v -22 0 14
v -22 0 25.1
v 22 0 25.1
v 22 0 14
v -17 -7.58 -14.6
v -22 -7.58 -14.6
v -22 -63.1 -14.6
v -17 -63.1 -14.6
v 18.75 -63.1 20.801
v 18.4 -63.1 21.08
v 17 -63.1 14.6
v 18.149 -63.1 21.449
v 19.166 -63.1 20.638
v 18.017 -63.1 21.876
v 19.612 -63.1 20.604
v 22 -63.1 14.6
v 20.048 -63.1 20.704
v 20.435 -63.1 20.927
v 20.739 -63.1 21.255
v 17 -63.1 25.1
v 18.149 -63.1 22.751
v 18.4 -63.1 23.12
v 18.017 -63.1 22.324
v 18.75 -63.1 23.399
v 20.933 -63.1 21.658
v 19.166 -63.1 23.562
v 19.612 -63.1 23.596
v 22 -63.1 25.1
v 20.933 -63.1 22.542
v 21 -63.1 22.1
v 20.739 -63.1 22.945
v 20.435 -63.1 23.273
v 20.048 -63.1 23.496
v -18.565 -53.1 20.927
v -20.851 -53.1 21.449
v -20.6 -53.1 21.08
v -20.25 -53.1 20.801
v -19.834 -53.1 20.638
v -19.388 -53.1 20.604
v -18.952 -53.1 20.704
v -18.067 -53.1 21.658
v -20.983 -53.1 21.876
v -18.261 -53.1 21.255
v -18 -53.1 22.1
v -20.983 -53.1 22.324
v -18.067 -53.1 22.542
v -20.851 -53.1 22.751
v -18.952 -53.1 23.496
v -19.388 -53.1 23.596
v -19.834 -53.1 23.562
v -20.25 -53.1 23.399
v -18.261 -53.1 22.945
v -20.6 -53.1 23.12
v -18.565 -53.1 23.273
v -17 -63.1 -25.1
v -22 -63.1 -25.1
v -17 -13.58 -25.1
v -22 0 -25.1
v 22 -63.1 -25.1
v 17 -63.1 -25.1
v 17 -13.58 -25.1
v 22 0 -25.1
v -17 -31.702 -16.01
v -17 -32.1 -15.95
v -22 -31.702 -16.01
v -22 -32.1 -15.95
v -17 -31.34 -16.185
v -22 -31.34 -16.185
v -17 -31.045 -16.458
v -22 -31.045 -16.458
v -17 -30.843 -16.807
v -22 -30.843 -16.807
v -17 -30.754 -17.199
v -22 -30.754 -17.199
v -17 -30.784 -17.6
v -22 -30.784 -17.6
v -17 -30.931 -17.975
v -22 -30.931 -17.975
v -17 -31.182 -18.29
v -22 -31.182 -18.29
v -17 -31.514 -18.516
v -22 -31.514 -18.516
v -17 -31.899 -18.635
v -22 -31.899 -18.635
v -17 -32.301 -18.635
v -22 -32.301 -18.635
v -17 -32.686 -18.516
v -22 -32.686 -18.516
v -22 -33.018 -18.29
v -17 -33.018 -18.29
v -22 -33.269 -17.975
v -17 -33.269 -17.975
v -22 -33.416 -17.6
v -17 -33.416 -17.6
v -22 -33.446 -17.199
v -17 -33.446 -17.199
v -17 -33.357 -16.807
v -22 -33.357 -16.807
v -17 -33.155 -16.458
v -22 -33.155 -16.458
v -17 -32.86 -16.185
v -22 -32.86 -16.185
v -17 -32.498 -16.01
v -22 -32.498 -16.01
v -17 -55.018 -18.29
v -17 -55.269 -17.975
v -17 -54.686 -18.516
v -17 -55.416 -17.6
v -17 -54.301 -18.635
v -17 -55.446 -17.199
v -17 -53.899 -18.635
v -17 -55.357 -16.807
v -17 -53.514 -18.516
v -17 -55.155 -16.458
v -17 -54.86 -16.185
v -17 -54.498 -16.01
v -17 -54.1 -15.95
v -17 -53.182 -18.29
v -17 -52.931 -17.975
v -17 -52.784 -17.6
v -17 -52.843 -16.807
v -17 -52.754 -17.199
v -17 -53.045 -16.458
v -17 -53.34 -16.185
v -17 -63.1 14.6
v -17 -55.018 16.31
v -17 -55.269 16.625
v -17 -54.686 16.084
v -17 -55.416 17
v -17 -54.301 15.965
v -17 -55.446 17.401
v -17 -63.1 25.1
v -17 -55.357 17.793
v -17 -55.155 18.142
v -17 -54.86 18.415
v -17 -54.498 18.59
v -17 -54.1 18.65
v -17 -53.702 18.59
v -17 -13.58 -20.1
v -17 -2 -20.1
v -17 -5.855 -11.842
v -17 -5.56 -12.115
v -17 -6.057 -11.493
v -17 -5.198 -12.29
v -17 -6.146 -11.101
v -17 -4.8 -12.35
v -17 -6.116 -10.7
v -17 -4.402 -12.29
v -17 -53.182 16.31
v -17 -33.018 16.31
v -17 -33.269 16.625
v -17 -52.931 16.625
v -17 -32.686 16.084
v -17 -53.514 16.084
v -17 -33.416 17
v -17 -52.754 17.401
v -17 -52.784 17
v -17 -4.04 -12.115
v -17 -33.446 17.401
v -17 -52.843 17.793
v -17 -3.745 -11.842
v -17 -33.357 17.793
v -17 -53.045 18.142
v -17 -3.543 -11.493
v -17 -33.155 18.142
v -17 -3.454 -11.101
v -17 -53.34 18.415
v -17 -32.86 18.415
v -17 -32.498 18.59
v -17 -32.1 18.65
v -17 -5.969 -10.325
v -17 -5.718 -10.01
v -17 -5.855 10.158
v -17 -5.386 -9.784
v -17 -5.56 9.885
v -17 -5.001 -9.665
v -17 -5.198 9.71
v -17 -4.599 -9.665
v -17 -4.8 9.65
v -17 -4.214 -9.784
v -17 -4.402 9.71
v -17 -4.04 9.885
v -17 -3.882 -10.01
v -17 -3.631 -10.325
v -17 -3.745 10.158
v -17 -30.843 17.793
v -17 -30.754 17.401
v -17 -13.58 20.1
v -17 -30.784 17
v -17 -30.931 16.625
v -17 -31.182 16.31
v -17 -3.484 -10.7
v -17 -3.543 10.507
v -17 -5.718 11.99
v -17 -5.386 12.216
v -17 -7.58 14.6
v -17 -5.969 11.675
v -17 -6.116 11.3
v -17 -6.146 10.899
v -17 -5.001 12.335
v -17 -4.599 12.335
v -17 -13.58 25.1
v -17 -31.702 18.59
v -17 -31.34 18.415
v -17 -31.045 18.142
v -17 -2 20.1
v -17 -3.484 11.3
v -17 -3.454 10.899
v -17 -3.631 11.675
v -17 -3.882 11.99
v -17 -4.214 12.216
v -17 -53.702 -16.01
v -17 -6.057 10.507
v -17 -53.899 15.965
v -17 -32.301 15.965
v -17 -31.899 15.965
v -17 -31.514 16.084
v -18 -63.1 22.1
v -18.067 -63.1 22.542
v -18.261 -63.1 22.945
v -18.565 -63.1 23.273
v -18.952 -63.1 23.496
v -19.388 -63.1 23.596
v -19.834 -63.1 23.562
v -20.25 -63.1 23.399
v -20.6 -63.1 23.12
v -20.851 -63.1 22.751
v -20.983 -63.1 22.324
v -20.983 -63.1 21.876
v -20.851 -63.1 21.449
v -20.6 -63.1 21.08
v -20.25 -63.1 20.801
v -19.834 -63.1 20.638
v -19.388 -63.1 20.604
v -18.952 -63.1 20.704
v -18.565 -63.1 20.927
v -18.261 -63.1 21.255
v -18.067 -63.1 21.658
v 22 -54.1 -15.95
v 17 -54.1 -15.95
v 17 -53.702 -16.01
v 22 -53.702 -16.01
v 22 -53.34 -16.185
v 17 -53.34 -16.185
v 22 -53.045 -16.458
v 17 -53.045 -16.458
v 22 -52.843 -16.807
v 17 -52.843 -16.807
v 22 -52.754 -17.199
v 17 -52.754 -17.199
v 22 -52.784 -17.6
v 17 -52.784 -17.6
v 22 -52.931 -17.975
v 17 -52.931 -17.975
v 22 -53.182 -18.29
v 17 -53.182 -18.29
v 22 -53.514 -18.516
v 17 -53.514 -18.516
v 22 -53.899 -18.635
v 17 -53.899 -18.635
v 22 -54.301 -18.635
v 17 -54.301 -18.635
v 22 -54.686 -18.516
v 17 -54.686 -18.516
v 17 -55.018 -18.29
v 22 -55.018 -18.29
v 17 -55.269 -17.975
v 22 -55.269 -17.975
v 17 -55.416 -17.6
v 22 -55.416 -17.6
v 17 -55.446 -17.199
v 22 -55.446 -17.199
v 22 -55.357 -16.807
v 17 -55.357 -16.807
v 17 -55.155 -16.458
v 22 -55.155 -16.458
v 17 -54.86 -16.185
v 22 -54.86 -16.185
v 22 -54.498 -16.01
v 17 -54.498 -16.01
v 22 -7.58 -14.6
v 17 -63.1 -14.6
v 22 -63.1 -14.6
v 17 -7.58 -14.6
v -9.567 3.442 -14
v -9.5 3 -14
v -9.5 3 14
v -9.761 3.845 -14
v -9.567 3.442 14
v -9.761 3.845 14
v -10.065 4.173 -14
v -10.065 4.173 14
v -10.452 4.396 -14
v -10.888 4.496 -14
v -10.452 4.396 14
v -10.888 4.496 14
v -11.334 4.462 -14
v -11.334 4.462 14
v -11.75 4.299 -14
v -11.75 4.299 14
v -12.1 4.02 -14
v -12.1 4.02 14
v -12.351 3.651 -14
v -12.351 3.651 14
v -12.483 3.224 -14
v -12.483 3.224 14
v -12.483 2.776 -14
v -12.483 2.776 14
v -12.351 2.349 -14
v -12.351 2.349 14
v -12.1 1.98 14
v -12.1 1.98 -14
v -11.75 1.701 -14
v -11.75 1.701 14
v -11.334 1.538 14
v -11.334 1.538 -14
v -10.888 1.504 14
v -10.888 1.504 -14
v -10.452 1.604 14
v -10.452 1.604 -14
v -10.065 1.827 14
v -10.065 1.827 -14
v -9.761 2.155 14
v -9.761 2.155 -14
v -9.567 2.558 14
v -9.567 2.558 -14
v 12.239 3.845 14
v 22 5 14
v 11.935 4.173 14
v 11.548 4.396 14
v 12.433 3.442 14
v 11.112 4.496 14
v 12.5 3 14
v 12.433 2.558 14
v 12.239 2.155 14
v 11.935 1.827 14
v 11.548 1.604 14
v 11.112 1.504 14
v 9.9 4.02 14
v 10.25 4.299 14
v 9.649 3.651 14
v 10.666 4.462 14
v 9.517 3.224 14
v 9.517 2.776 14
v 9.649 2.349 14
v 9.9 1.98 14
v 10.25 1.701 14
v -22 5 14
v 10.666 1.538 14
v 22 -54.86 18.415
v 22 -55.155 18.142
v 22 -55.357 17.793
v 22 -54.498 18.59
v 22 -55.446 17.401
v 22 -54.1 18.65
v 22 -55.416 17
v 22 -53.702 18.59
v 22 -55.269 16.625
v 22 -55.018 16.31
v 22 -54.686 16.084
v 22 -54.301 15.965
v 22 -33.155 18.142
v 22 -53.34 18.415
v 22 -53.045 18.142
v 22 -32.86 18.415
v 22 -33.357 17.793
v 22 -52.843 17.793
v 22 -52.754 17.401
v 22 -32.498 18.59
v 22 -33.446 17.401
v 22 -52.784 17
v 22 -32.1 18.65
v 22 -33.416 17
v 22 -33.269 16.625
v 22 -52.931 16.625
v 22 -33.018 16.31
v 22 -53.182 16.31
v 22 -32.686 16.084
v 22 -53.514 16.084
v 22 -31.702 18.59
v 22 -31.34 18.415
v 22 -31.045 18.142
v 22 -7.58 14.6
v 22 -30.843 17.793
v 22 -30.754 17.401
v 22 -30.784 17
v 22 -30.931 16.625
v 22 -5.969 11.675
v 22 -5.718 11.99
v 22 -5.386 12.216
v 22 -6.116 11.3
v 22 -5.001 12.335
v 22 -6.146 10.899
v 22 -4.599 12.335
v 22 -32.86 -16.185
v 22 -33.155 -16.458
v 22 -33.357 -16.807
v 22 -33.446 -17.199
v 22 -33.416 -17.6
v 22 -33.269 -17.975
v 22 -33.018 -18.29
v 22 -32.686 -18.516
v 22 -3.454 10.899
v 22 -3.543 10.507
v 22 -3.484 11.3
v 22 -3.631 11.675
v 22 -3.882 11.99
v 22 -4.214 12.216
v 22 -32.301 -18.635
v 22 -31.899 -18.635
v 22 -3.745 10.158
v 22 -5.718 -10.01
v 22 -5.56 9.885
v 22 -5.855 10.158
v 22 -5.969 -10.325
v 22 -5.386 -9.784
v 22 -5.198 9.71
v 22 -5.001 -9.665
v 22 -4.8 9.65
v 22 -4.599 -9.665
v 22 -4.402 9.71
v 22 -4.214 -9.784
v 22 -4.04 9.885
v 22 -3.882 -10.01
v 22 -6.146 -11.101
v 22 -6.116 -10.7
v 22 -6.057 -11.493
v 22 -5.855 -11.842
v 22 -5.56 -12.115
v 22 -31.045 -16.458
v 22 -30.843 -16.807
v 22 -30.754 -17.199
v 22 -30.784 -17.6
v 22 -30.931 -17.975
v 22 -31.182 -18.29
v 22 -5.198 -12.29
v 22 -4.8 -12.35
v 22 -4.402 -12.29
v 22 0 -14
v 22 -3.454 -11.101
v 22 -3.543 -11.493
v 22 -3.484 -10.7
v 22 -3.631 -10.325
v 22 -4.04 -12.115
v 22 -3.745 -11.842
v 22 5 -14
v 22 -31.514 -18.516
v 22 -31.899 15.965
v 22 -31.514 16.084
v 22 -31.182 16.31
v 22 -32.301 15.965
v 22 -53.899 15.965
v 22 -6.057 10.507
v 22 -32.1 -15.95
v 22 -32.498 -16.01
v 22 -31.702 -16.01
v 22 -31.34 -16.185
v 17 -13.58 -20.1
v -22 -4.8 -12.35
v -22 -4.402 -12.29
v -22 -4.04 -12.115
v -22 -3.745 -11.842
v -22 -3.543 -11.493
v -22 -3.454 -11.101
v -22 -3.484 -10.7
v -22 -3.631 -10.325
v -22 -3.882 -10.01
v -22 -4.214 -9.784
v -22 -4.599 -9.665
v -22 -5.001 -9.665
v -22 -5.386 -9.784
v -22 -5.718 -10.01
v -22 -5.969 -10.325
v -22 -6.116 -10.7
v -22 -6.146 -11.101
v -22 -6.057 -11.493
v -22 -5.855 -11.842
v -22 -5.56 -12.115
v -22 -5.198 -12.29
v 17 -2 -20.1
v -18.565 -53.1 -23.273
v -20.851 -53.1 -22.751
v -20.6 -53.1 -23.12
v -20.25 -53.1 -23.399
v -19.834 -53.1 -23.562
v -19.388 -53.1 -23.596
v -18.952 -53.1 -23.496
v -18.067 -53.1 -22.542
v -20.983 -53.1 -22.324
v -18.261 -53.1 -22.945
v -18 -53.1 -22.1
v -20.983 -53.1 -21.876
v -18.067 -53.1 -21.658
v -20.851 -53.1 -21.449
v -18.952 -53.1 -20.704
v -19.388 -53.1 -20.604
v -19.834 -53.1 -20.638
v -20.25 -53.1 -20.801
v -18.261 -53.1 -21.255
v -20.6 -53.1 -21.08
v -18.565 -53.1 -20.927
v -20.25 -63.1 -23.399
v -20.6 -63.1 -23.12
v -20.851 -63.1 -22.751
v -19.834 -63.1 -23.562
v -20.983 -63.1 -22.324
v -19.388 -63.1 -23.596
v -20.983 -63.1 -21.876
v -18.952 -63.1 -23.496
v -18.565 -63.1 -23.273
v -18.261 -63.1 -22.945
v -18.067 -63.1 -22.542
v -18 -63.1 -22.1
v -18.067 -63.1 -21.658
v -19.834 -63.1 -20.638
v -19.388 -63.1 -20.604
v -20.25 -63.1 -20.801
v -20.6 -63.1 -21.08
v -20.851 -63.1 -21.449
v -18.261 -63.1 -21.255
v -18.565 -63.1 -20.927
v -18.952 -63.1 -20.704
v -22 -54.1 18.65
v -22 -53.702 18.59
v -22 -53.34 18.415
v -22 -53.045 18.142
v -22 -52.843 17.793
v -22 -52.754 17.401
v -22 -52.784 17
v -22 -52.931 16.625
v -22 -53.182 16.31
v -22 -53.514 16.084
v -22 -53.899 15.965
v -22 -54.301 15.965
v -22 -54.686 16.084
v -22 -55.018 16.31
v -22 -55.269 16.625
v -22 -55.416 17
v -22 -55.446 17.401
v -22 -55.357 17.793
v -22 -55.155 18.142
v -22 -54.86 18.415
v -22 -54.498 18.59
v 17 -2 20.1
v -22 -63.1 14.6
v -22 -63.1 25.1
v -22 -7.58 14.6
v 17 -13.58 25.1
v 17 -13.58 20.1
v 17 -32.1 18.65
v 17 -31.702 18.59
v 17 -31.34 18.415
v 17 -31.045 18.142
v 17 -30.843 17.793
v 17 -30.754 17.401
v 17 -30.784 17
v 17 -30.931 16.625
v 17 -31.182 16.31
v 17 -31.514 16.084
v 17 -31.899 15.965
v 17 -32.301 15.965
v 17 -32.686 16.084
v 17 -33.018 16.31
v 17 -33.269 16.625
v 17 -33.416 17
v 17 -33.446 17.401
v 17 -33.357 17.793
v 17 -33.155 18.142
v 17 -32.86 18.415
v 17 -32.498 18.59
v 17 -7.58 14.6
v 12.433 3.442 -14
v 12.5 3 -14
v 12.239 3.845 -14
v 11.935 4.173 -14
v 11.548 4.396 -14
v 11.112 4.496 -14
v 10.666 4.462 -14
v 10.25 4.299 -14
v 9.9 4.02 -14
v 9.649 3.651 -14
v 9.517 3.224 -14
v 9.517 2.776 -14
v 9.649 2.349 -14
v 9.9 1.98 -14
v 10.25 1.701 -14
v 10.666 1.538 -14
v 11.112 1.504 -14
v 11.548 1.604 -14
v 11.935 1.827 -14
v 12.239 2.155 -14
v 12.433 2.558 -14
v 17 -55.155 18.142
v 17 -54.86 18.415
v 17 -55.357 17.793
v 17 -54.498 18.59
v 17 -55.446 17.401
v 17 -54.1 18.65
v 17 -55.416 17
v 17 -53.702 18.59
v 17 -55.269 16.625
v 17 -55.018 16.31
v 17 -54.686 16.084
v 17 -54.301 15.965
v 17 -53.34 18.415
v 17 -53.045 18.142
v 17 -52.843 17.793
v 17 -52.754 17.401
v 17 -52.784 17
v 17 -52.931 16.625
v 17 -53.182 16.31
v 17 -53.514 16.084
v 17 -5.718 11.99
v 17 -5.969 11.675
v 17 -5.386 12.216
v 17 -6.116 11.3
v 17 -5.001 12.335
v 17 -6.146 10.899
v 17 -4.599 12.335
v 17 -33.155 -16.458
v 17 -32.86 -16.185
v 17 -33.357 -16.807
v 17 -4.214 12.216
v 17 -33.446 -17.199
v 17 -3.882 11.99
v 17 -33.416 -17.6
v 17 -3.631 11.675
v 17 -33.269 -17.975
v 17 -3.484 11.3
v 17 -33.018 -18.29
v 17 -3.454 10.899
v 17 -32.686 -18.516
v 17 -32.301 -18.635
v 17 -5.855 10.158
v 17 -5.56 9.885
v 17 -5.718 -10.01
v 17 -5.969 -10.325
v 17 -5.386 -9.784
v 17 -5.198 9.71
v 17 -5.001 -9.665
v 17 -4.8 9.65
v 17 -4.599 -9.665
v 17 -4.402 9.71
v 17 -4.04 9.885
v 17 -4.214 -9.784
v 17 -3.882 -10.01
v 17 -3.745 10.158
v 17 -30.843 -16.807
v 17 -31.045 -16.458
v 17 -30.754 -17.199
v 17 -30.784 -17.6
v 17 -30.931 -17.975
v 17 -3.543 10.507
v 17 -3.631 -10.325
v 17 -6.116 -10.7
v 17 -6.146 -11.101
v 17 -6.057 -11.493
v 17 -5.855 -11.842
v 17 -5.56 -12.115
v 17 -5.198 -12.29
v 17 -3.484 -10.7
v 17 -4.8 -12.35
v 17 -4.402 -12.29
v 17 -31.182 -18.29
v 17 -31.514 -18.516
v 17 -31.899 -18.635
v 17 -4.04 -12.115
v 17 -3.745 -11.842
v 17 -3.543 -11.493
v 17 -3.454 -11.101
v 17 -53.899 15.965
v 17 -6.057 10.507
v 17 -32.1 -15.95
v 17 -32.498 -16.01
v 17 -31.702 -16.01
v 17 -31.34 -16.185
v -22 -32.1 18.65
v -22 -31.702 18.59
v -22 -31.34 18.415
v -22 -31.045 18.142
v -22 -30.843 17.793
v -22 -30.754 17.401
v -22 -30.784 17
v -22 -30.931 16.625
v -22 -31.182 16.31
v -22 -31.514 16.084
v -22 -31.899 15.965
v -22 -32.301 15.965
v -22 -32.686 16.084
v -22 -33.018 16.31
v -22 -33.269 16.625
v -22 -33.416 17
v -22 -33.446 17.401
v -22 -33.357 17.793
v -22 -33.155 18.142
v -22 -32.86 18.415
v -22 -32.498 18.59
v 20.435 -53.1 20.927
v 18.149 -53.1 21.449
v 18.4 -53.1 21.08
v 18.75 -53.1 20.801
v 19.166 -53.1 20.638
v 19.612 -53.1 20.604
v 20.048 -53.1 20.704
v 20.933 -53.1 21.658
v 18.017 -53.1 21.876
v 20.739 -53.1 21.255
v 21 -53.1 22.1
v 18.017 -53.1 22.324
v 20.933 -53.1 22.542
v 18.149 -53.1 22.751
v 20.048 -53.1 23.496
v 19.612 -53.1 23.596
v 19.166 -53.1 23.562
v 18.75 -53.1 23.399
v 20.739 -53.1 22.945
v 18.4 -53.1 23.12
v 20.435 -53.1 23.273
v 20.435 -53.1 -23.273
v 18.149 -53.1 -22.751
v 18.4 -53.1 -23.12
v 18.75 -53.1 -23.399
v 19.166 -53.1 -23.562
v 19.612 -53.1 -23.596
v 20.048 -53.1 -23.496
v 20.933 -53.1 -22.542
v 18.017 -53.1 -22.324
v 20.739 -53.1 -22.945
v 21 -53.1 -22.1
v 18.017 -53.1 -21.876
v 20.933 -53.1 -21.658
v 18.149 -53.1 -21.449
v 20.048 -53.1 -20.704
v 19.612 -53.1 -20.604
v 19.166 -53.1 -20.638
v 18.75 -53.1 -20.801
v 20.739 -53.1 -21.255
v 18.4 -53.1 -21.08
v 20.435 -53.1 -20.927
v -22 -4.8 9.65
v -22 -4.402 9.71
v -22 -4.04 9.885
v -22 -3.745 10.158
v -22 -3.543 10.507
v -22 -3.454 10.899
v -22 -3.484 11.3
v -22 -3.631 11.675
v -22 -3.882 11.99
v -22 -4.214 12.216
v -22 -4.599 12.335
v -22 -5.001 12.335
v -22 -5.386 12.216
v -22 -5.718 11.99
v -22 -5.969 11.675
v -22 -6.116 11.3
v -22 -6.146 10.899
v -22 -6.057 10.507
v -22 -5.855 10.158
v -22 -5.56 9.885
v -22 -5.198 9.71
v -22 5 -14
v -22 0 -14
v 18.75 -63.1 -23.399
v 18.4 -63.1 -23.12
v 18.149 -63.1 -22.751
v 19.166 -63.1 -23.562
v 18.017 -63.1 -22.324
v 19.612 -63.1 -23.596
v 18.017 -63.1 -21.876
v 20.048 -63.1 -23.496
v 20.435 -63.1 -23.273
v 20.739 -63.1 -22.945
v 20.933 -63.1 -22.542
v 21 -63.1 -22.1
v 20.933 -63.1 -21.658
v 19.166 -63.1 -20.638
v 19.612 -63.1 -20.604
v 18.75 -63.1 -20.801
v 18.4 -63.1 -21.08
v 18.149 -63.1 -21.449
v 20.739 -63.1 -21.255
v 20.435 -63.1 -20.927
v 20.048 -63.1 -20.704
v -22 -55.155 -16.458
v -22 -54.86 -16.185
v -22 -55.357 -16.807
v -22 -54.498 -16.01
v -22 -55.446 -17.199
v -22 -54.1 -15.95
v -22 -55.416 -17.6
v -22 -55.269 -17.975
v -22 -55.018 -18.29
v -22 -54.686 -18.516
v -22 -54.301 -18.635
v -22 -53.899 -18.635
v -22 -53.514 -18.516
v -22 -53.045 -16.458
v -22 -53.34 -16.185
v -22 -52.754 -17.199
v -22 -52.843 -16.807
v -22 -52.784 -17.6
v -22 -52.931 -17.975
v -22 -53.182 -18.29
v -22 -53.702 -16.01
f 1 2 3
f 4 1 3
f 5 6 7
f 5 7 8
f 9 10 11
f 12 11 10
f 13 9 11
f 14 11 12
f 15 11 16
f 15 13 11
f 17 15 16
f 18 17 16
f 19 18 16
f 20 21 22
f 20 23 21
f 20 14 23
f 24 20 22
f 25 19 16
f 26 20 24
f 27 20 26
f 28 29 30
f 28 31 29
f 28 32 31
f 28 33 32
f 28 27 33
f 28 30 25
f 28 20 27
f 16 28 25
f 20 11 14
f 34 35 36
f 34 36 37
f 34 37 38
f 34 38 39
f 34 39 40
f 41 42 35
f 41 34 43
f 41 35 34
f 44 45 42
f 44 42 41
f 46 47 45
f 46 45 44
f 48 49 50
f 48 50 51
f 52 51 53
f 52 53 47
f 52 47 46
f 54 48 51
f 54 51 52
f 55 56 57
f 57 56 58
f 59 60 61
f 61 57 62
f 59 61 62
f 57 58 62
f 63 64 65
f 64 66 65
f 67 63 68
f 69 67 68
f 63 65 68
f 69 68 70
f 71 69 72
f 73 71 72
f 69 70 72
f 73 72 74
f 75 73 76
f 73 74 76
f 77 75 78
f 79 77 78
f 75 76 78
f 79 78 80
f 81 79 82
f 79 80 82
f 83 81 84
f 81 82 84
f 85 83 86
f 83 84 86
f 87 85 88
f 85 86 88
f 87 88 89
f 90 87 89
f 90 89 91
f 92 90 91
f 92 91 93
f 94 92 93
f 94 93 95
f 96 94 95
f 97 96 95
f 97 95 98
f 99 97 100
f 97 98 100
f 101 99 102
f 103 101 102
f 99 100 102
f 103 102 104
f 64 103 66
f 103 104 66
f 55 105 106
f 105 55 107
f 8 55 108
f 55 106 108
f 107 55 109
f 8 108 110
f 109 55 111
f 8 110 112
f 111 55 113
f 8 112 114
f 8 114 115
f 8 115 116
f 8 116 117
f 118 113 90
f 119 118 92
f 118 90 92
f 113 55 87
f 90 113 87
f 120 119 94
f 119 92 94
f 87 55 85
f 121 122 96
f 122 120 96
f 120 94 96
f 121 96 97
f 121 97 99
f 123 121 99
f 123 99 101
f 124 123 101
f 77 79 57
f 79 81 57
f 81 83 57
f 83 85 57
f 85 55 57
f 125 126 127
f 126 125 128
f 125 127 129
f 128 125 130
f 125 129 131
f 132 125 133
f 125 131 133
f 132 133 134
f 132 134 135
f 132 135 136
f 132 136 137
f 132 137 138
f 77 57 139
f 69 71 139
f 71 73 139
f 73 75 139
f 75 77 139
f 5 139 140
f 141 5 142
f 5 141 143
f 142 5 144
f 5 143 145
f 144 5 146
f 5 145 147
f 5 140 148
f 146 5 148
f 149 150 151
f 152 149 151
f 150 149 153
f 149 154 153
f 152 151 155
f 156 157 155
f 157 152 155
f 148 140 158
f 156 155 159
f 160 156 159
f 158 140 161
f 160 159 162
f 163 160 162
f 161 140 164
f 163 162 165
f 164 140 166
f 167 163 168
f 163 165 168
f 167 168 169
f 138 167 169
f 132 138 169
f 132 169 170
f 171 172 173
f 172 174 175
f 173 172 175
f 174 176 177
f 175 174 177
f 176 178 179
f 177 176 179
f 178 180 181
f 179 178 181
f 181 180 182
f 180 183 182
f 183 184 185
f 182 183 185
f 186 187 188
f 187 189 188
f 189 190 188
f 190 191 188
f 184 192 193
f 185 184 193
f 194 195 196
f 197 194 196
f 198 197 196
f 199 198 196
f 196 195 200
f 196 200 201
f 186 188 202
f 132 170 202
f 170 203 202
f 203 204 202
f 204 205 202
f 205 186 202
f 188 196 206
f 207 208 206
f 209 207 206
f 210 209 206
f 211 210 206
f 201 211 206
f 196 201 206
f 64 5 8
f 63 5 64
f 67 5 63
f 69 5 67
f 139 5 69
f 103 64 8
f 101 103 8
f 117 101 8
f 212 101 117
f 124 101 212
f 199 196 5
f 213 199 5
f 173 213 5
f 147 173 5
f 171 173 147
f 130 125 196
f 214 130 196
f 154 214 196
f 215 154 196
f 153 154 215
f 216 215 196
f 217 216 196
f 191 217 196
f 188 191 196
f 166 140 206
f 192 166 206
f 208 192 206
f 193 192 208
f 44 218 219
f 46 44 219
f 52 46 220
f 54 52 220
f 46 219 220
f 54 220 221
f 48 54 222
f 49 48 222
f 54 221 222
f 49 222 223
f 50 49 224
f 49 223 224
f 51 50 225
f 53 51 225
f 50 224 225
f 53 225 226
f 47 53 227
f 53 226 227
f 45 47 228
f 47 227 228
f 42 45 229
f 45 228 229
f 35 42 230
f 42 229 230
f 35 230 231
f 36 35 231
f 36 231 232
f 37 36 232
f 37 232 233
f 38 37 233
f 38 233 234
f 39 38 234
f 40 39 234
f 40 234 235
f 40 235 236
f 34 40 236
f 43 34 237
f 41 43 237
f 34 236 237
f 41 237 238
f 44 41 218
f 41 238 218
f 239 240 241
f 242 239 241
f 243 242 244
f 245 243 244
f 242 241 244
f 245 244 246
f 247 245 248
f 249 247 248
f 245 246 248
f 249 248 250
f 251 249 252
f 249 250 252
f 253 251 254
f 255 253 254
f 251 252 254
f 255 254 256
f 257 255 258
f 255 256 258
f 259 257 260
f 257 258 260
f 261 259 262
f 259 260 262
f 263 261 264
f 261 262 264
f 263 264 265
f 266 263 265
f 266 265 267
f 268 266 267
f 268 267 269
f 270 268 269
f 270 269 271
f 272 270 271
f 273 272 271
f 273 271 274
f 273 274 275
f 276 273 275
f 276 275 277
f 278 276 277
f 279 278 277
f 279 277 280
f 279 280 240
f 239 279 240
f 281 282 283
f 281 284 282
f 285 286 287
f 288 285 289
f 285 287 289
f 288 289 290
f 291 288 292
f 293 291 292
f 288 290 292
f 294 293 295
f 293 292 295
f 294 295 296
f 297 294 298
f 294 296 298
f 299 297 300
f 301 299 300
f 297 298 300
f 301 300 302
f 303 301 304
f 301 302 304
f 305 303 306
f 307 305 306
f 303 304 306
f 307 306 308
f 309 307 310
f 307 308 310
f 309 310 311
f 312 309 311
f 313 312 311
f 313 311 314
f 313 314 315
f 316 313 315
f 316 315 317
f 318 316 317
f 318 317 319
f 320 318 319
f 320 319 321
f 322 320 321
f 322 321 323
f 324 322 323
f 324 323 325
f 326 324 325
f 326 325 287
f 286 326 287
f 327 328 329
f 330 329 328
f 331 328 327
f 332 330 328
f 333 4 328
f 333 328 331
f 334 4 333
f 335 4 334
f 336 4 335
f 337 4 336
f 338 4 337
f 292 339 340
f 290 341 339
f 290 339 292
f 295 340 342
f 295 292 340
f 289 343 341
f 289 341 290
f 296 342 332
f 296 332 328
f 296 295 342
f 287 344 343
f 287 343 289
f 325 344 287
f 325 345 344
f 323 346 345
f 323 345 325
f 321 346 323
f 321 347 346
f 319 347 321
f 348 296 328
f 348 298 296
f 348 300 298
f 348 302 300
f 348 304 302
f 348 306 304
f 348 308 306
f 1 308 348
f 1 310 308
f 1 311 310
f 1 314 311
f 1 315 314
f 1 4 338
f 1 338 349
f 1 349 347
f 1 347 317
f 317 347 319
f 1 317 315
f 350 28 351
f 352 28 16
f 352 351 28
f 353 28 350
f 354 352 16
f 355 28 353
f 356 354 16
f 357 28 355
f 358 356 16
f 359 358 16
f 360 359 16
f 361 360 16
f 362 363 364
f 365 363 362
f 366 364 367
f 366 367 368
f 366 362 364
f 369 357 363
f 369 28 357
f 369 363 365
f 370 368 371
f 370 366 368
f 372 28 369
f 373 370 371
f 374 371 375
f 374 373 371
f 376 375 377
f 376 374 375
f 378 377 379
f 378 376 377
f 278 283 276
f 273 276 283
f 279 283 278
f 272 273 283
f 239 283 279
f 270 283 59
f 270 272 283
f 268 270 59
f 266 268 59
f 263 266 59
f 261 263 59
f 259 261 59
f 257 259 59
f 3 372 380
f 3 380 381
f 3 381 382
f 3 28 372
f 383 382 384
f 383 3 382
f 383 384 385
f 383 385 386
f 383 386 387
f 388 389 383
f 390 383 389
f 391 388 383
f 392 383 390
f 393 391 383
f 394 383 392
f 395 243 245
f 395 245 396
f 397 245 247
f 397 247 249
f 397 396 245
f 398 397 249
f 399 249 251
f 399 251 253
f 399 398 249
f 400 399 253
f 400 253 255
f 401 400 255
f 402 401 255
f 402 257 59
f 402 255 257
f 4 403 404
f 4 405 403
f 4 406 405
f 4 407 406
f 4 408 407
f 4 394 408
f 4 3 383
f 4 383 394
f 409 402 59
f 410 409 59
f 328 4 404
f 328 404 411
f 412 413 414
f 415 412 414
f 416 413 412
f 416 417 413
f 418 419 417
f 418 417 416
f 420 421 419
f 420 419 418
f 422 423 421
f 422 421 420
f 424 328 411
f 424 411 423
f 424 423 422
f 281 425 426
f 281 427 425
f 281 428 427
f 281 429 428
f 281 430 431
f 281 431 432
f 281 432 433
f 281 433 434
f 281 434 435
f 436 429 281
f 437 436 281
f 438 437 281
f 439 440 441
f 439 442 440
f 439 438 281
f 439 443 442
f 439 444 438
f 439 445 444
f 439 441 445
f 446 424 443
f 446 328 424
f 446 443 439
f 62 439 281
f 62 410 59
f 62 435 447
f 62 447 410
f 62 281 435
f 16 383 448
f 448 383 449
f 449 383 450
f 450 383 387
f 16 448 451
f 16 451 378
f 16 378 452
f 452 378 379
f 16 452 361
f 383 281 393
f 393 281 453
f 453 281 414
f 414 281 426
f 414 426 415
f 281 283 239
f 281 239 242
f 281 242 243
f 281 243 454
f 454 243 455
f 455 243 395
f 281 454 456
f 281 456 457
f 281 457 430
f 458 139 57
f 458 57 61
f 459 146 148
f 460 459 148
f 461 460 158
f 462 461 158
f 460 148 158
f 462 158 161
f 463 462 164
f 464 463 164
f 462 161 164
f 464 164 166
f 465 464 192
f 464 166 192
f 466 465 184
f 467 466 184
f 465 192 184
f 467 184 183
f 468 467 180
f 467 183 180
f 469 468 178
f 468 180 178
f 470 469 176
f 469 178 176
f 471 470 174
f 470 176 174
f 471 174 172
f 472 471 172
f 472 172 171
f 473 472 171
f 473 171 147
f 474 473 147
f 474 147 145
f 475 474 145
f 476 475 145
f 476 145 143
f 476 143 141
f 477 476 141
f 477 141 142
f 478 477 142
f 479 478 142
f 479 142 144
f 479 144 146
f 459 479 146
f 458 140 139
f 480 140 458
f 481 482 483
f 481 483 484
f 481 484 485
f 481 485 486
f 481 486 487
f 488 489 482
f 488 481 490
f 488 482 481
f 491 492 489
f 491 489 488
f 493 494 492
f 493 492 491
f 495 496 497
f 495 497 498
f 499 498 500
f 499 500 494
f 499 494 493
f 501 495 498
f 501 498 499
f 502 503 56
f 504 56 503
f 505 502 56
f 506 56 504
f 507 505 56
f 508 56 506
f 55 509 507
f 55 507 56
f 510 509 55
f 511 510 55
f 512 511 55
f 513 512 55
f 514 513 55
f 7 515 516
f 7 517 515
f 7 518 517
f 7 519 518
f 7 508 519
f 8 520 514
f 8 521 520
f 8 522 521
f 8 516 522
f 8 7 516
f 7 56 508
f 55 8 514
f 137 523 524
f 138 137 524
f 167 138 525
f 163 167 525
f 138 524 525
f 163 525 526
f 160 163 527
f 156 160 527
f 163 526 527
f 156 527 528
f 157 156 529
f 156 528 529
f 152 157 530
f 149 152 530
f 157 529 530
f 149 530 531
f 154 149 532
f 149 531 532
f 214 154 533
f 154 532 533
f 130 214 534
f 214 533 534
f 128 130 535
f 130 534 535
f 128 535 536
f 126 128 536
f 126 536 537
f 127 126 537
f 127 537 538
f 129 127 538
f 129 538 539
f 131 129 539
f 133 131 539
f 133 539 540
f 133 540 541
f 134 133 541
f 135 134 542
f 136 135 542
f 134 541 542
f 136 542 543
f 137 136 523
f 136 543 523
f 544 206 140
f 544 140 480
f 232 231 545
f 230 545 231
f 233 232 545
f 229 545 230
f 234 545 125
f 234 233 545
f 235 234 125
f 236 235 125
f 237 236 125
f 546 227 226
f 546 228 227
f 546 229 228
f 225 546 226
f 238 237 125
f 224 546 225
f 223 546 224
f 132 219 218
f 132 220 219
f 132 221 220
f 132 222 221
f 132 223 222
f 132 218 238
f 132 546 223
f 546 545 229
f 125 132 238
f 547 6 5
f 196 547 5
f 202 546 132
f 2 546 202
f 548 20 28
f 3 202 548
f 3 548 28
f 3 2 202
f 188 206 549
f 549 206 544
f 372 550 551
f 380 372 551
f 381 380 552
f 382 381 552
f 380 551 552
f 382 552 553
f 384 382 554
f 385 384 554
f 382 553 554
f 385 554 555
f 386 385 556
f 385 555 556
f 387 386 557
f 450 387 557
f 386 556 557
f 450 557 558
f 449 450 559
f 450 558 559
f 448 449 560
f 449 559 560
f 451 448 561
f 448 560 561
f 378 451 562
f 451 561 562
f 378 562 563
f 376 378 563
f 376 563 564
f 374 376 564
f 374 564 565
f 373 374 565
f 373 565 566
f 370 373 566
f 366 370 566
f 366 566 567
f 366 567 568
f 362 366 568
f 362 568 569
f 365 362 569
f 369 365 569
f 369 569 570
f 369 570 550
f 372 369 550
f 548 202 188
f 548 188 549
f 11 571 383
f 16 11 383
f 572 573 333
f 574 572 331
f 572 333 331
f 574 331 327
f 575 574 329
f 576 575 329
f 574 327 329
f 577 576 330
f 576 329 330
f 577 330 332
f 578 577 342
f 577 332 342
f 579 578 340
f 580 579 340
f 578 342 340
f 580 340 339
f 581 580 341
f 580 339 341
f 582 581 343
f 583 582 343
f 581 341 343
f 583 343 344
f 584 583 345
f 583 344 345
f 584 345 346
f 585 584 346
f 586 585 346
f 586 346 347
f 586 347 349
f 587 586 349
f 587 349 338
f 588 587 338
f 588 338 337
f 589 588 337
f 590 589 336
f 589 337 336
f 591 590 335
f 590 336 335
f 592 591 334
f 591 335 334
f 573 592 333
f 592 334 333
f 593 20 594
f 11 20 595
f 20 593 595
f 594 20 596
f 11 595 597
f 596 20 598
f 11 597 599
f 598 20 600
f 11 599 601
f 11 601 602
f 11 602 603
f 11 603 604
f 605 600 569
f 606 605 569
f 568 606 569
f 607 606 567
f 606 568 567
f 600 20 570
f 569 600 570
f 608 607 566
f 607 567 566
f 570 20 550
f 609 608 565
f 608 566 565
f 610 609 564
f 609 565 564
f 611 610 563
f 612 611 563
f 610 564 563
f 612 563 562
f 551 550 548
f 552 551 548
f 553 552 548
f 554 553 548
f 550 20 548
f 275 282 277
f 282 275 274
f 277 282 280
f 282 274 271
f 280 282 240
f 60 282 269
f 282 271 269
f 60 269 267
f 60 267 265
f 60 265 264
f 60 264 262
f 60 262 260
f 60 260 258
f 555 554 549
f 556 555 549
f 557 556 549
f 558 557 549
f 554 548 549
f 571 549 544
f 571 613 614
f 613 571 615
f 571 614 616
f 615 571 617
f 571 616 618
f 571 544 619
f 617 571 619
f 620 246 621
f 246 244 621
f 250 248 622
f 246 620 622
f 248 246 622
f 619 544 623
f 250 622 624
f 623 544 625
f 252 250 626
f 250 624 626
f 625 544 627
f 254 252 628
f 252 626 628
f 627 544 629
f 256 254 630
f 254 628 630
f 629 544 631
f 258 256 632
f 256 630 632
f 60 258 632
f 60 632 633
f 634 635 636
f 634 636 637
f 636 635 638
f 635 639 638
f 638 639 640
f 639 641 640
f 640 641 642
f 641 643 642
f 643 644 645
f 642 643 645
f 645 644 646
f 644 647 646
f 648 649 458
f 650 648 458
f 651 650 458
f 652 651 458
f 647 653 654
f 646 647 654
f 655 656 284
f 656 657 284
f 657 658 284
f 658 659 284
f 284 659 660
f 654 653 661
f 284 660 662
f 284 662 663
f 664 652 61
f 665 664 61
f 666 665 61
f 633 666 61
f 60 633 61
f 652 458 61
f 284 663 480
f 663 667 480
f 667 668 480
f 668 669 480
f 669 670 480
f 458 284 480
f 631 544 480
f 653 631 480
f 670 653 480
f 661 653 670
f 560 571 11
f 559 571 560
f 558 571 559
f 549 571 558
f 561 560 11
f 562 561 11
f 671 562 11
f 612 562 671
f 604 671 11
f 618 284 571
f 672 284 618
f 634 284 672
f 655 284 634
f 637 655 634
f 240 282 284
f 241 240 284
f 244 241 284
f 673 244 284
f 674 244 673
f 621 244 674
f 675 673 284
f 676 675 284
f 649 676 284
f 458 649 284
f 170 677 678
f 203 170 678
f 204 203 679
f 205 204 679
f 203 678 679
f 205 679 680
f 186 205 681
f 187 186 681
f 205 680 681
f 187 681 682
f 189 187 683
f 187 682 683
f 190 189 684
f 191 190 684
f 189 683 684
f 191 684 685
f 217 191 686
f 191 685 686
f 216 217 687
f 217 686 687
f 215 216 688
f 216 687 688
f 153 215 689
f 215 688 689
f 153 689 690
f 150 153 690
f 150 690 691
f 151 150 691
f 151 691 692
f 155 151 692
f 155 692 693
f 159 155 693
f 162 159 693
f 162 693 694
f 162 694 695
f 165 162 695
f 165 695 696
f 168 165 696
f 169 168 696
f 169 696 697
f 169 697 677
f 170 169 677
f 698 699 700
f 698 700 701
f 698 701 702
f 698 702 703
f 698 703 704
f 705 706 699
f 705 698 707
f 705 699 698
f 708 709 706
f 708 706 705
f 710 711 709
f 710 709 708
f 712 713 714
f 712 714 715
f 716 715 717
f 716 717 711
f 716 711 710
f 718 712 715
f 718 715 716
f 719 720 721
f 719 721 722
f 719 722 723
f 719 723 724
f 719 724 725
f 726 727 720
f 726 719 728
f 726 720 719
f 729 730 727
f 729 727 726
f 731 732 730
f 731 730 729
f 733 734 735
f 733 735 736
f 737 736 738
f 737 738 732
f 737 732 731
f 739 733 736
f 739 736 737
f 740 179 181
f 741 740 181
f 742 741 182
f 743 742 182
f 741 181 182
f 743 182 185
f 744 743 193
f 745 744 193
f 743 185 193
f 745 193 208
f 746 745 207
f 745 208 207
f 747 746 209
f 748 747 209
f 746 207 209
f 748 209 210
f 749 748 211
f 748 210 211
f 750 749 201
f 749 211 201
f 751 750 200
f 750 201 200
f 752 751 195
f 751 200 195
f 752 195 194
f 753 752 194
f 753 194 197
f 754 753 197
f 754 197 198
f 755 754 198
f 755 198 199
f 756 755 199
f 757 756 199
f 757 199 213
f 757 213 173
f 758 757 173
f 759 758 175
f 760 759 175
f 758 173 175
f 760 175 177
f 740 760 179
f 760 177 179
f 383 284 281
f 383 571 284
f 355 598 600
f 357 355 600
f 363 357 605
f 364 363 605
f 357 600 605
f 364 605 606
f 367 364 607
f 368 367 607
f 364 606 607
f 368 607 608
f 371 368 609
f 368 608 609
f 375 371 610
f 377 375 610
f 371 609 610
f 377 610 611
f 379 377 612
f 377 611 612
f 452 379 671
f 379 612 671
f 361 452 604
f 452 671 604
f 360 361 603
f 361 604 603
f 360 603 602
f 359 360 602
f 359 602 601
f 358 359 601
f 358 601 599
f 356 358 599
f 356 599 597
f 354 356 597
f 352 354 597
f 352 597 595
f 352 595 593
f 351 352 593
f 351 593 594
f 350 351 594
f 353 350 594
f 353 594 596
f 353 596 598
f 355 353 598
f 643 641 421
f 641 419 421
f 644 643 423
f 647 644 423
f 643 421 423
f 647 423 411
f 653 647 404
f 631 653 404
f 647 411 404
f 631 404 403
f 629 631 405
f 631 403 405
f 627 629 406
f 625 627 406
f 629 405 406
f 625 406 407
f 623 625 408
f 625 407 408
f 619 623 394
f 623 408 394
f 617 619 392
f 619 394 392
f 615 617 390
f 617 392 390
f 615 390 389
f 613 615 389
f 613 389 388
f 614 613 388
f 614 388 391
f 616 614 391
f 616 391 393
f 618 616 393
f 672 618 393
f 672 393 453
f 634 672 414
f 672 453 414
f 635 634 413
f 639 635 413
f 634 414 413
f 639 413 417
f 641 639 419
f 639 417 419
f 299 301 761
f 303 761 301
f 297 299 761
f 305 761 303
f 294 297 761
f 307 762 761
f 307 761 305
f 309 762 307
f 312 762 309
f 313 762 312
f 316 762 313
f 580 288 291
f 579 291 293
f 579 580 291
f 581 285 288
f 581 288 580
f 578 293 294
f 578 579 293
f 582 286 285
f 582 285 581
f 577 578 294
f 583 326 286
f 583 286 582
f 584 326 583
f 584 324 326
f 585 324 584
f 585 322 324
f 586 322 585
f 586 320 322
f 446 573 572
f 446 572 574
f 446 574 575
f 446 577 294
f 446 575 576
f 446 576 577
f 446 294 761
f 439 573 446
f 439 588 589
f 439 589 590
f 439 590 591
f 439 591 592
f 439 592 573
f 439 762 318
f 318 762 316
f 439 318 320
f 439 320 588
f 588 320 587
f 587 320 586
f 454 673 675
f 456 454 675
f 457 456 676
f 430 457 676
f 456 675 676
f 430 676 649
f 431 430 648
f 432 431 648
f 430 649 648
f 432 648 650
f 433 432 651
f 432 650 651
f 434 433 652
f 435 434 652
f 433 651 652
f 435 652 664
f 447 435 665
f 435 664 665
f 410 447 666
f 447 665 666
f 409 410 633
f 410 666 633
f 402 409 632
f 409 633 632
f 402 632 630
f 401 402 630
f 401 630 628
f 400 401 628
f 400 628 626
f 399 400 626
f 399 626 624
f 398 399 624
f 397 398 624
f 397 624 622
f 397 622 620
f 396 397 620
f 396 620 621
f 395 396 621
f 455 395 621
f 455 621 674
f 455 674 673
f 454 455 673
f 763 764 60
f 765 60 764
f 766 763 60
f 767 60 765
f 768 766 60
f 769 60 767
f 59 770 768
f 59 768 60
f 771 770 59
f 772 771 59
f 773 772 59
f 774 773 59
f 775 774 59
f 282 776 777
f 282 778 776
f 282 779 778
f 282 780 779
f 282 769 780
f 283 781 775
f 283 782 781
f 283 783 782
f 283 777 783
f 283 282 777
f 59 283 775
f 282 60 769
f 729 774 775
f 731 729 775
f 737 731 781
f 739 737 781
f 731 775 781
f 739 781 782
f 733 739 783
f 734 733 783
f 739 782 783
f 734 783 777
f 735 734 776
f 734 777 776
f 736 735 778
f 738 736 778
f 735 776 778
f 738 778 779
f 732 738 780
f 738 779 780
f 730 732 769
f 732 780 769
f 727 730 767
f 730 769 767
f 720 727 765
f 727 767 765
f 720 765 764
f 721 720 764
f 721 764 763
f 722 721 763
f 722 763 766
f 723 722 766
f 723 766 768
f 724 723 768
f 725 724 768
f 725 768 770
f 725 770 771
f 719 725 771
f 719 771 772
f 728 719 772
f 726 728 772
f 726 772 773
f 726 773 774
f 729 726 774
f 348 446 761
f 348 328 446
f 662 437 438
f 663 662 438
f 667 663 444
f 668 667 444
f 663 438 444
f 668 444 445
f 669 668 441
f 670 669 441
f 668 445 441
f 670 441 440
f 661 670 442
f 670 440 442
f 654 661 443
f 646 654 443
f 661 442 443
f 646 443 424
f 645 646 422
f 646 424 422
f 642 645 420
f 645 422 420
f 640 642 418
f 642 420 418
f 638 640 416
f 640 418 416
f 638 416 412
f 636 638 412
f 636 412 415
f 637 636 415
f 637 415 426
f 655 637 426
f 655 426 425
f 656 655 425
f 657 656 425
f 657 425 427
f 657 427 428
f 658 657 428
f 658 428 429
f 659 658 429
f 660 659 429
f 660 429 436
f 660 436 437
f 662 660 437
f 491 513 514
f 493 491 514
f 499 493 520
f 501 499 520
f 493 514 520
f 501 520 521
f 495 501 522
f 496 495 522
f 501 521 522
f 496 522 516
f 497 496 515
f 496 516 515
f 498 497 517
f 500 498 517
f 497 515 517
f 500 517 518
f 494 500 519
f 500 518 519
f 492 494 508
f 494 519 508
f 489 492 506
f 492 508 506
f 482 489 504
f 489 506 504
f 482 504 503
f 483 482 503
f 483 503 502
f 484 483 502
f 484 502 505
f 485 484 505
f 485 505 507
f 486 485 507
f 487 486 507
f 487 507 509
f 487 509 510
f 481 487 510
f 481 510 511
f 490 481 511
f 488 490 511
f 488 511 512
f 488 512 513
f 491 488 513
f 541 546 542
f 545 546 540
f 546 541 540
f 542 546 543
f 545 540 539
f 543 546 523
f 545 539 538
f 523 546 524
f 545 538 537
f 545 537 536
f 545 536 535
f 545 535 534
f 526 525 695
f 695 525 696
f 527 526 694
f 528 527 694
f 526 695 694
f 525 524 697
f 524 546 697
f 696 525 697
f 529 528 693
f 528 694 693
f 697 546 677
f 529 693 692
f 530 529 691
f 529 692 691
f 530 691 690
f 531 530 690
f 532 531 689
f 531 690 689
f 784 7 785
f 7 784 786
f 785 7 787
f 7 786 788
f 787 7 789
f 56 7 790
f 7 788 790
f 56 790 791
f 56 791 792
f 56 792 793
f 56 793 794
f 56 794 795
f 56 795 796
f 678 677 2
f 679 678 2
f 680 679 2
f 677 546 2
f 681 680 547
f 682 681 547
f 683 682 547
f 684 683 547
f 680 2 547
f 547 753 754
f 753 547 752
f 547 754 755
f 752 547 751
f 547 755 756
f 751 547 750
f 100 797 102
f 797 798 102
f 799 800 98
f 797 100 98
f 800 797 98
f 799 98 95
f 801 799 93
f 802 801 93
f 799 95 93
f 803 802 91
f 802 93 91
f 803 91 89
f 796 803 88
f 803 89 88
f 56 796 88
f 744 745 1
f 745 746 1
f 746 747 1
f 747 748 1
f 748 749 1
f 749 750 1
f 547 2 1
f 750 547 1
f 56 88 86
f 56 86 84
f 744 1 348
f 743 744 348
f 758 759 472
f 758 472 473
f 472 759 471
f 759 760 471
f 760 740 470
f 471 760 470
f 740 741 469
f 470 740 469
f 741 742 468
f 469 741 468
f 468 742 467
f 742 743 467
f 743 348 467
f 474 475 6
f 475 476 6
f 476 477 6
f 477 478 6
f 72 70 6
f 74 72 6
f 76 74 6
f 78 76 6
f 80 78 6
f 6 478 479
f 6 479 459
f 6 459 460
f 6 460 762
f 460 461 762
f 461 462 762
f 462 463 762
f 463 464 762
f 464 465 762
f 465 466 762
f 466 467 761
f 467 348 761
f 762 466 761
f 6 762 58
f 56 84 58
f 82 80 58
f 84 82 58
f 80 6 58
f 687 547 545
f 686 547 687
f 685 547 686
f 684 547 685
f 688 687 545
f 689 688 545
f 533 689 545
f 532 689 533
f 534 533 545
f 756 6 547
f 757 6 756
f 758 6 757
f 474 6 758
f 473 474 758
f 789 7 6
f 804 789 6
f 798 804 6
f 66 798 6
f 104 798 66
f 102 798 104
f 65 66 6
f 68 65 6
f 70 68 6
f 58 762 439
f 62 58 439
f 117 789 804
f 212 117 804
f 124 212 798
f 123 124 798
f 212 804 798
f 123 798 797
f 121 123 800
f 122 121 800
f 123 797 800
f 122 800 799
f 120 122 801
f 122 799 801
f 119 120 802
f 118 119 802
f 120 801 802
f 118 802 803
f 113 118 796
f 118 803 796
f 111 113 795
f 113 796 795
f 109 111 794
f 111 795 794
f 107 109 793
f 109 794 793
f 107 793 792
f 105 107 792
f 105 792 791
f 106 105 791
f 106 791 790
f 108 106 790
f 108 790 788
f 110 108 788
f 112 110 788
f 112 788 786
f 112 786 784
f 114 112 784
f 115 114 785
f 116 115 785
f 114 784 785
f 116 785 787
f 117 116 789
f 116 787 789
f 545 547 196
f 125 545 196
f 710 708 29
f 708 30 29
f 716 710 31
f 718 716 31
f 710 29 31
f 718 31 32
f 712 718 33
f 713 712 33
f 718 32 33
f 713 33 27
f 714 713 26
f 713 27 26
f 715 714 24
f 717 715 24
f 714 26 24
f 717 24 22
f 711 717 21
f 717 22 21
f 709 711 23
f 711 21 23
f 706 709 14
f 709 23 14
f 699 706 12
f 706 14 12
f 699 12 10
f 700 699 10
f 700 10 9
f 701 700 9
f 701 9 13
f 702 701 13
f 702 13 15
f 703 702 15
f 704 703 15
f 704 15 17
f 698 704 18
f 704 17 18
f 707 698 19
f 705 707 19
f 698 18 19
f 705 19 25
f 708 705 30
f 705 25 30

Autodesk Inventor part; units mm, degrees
ref_plane "YZ Plane" through (0, 0, 0) normal (1, 0, 0) x (0, 1, 0)
ref_plane "XZ Plane" through (0, 0, 0) normal (0, 1, 0) x (-1, 0, 0)
ref_plane "XY Plane" through (0, 0, 0) normal (0, 0, 1) x (1, 0, 0)
sketch "스케치1" plane through (0, 0, 0) normal (0, 1, 0) x (-1, 0, 0)
  line L0 (22, -14) -> (-22, -14)
  line L1 (-22, -14) -> (-22, 14)
  line L2 (-22, 14) -> (22, 14)
  line L3 (22, 14) -> (22, -14)
  point P0 (0, 0)
  dimension "d0" = 44
  dimension "d1" = 22
  dimension "d2" = 28
  dimension "d3" = 14
extrude "돌출1" add sketch "스케치1" along normal blind 5
sketch "스케치2" plane through (-22, 0, 14) normal (0, 0, 1) x (1, 0, 0)
  circle A0 centre (33, 3) radius 1.5
  circle A1 centre (11, 3) radius 1.5
  line L0 (44, 0) -> (0, 0) projected
  line L1 (22, 0) -> (22, 5)
  line L2 (44, 5) -> (0, 5) projected
  dimension "d6" = 3
  dimension "d7" = 3
  dimension "d8" = 3
  dimension "d9" = 3
  dimension "d10" = 22
  dimension "d11" = 11
extrude "돌출2" cut sketch "스케치2" against normal blind 60
sketch "스케치3" plane through (0, 0, 0) normal (0, -1, 0) x (1, 0, 0)
  line L0 (-17, 14.5) -> (17, 14.5)
  line L1 (17, 14.5) -> (17, -14.5)
  line L2 (17, -14.5) -> (-17, -14.5)
  line L3 (-17, -14.5) -> (-17, 14.5)
  line L4 (22, -14) -> (-22, -14) projected
  line L5 (22, 25.1) -> (-22, 25.1)
  line L6 (-22, 25.1) -> (-22, -25.1)
  line L7 (-22, -25.1) -> (22, -25.1)
  line L8 (22, -25.1) -> (22, 25.1)
  point P0 (0, 0)
  dimension "d17" = 34
  dimension "d18" = 17
  dimension "d20" = 29
  dimension "d21" = 14.5
  dimension "d22" = 10.6
  dimension "d23" = 10.6
  dimension "d24" = 5
  dimension "d25" = 5
extrude "돌출3" add sketch "스케치3" along normal blind 2
sketch "스케치4" plane through (0, -2, 0) normal (0, -1, 0) x (1, 0, 0)
  line L0 (-22, 25.1) -> (-22, -25.1) projected
  line L1 (-22, -25.1) -> (22, -25.1) projected
  line L2 (-22, 25.1) -> (22, 25.1)
  line L3 (22, 25.1) -> (22, -25.1)
  line L4 (22, -25.1) -> (-22, -25.1)
  line L5 (-22, -25.1) -> (-22, 25.1)
  line L6 (-17, 20.1) -> (17, 20.1)
  line L7 (17, 20.1) -> (17, -20.1)
  line L8 (17, -20.1) -> (-17, -20.1)
  line L9 (-17, -20.1) -> (-17, 20.1)
  point P0 (0, 0)
  dimension "d28" = 5
  dimension "d29" = 5
  dimension "d30" = 5
  dimension "d31" = 5
extrude "돌출4" add sketch "스케치4" along normal blind 5.58
sketch "스케치5" plane through (22, 5, 14) normal (1, 0, 0) x (0, 0, -1)
  circle A0 centre (25, -9.8) radius 1.35
  circle A1 centre (3, -9.8) radius 1.35
  line L0 (39.1, -5) -> (28, -5) projected
  line L1 (0, -5) -> (-11.1, -5) projected
  point P0 (14, -5)
  dimension "d34" = 2.7
  dimension "d35" = 2.7
  dimension "d36" = 4.8
  dimension "d37" = 4.8
  dimension "d38" = 22
  dimension "d39" = 11
extrude "돌출5" cut sketch "스케치5" against normal blind 90
sketch "스케치6" plane through (0, -7.58, 0) normal (0, -1, 0) x (1, 0, 0)
  line L0 (22, -25.1) -> (-22, -25.1)
  line L1 (-22, -25.1) -> (-22, -20.1)
  line L2 (-22, -20.1) -> (22, -20.1)
  line L3 (22, -20.1) -> (22, -25.1)
  line L4 (22, 25.1) -> (-22, 25.1)
  line L5 (-22, 25.1) -> (-22, 20.1)
  line L6 (-22, 20.1) -> (22, 20.1)
  line L7 (22, 20.1) -> (22, 25.1)
  point P0 (0, 0)
  dimension "d42" = 5
  dimension "d43" = 5
extrude "돌출6" add sketch "스케치6" along normal blind 6
sketch "스케치7" plane through (0, -7.58, 0) normal (0, -1, 0) x (1, 0, 0)
  line L0 (22, -20.1) -> (-22, -20.1) projected
  line L1 (17, 20.1) -> (17, -20.1) projected
  line L2 (22, -20.1) -> (17, -20.1)
  line L3 (17, -20.1) -> (17, -14.6)
  line L4 (17, -14.6) -> (22, -14.6)
  line L5 (22, -14.6) -> (22, -20.1)
  line L6 (22, 14) -> (22, 25.1) projected
  line L7 (22, 20.1) -> (17, 20.1)
  line L8 (17, 20.1) -> (17, 14.6)
  line L9 (17, 14.6) -> (22, 14.6)
  line L10 (22, 14.6) -> (22, 20.1)
  line L11 (-22, -14) -> (-22, 14) projected
  line L12 (-17, -20.1) -> (-22, -20.1)
  line L13 (-22, -20.1) -> (-22, -14.6)
  line L14 (-22, -14.6) -> (-17, -14.6)
  line L15 (-17, -14.6) -> (-17, -20.1)
  line L16 (-17, 20.1) -> (-22, 20.1)
  line L17 (-22, 20.1) -> (-22, 14.6)
  line L18 (-22, 14.6) -> (-17, 14.6)
  line L19 (-17, 14.6) -> (-17, 20.1)
  line L20 (22, 20.1) -> (17, 20.1) projected
  point P0 (0, 0)
  dimension "d46" = 5.5
  dimension "d47" = 5.5
  dimension "d48" = 5.5
  dimension "d49" = 5.5
  dimension "d50" = 0
extrude "돌출7" add sketch "스케치7" along normal blind 55.52
sketch "스케치8" plane through (0, -13.58, 0) normal (0, -1, 0) x (1, 0, 0)
  line L0 (-22, -20.1) -> (-22, -25.1) projected
  line L1 (-17, -20.1) -> (-22, -20.1) projected
  line L2 (-22, -25.1) -> (-17, -25.1)
  line L3 (-17, -25.1) -> (-17, -20.1)
  line L4 (-17, -20.1) -> (-22, -20.1)
  line L5 (-22, -20.1) -> (-22, -25.1)
  line L6 (-17, -20.1) -> (17, -20.1) projected
  line L7 (22, -25.1) -> (22, -20.1) projected
  line L8 (17, -20.1) -> (22, -20.1)
  line L9 (22, -20.1) -> (22, -25.1)
  line L10 (22, -25.1) -> (17, -25.1)
  line L11 (17, -25.1) -> (17, -20.1)
  line L12 (17, -20.1) -> (17, 20.1) projected
  line L13 (22, 20.1) -> (22, 25.1) projected
  line L14 (17, 20.1) -> (22, 20.1)
  line L15 (22, 20.1) -> (22, 25.1)
  line L16 (22, 25.1) -> (17, 25.1)
  line L17 (17, 25.1) -> (17, 20.1)
  line L18 (-22, 25.1) -> (-22, 20.1) projected
  line L19 (22, 25.1) -> (-22, 25.1) projected
  line L20 (-22, 20.1) -> (-17, 20.1)
  line L21 (-17, 20.1) -> (-17, 25.1)
  line L22 (-17, 25.1) -> (-22, 25.1)
  line L23 (-22, 25.1) -> (-22, 20.1)
  point P0 (0, 0)
extrude "돌출8" add sketch "스케치8" along normal blind 49.52
sketch "스케치9" plane through (-22, 5, -14) normal (-1, 0, 0) x (0, 0, 1)
  circle A0 centre (31.3, -59.1) radius 1.35
  circle A1 centre (-3.3, -59.1) radius 1.35
  line L0 (-0.6, -68.1) -> (-11.1, -68.1) projected
  line L1 (39.1, -68.1) -> (28.6, -68.1) projected
  line L2 (39.1, -5) -> (39.1, -68.1) projected
  line L3 (-11.1, -5) -> (-11.1, -68.1) projected
  circle A2 centre (31.3, -37.1) radius 1.35
  circle A3 centre (-3.3, -37.1) radius 1.35
  point P0 (14, -5)
  dimension "d55" = 9
  dimension "d56" = 9
  dimension "d57" = 2.7
  dimension "d58" = 2.7
  dimension "d59" = 7.8
  dimension "d60" = 7.8
  dimension "d61" = 2.7
  dimension "d62" = 2.7
  dimension "d63" = 22
  dimension "d64" = 22
extrude "돌출9" cut sketch "스케치9" against normal blind 49.52
sketch "스케치10" plane through (0, -63.1, 0) normal (0, -1, 0) x (1, 0, 0)
  circle A0 centre (19.5, 22.1) radius 1.5
  line L0 (22, 14.6) -> (22, 25.1) projected
  line L1 (22, 25.1) -> (17, 25.1) projected
  line L2 (0, 0) -> (14.9637, 0)
  line L3 (0, 0) -> (0, 14.6)
  circle A1 centre (19.5, -22.1) radius 1.5
  circle A2 centre (-19.5, 22.1) radius 1.5
  circle A3 centre (-19.5, -22.1) radius 1.5
  dimension "d67" = 2.5
  dimension "d68" = 3
  dimension "d69" = 3
extrude "돌출10" cut sketch "스케치10" against normal blind 10
properties part number "elbow"
